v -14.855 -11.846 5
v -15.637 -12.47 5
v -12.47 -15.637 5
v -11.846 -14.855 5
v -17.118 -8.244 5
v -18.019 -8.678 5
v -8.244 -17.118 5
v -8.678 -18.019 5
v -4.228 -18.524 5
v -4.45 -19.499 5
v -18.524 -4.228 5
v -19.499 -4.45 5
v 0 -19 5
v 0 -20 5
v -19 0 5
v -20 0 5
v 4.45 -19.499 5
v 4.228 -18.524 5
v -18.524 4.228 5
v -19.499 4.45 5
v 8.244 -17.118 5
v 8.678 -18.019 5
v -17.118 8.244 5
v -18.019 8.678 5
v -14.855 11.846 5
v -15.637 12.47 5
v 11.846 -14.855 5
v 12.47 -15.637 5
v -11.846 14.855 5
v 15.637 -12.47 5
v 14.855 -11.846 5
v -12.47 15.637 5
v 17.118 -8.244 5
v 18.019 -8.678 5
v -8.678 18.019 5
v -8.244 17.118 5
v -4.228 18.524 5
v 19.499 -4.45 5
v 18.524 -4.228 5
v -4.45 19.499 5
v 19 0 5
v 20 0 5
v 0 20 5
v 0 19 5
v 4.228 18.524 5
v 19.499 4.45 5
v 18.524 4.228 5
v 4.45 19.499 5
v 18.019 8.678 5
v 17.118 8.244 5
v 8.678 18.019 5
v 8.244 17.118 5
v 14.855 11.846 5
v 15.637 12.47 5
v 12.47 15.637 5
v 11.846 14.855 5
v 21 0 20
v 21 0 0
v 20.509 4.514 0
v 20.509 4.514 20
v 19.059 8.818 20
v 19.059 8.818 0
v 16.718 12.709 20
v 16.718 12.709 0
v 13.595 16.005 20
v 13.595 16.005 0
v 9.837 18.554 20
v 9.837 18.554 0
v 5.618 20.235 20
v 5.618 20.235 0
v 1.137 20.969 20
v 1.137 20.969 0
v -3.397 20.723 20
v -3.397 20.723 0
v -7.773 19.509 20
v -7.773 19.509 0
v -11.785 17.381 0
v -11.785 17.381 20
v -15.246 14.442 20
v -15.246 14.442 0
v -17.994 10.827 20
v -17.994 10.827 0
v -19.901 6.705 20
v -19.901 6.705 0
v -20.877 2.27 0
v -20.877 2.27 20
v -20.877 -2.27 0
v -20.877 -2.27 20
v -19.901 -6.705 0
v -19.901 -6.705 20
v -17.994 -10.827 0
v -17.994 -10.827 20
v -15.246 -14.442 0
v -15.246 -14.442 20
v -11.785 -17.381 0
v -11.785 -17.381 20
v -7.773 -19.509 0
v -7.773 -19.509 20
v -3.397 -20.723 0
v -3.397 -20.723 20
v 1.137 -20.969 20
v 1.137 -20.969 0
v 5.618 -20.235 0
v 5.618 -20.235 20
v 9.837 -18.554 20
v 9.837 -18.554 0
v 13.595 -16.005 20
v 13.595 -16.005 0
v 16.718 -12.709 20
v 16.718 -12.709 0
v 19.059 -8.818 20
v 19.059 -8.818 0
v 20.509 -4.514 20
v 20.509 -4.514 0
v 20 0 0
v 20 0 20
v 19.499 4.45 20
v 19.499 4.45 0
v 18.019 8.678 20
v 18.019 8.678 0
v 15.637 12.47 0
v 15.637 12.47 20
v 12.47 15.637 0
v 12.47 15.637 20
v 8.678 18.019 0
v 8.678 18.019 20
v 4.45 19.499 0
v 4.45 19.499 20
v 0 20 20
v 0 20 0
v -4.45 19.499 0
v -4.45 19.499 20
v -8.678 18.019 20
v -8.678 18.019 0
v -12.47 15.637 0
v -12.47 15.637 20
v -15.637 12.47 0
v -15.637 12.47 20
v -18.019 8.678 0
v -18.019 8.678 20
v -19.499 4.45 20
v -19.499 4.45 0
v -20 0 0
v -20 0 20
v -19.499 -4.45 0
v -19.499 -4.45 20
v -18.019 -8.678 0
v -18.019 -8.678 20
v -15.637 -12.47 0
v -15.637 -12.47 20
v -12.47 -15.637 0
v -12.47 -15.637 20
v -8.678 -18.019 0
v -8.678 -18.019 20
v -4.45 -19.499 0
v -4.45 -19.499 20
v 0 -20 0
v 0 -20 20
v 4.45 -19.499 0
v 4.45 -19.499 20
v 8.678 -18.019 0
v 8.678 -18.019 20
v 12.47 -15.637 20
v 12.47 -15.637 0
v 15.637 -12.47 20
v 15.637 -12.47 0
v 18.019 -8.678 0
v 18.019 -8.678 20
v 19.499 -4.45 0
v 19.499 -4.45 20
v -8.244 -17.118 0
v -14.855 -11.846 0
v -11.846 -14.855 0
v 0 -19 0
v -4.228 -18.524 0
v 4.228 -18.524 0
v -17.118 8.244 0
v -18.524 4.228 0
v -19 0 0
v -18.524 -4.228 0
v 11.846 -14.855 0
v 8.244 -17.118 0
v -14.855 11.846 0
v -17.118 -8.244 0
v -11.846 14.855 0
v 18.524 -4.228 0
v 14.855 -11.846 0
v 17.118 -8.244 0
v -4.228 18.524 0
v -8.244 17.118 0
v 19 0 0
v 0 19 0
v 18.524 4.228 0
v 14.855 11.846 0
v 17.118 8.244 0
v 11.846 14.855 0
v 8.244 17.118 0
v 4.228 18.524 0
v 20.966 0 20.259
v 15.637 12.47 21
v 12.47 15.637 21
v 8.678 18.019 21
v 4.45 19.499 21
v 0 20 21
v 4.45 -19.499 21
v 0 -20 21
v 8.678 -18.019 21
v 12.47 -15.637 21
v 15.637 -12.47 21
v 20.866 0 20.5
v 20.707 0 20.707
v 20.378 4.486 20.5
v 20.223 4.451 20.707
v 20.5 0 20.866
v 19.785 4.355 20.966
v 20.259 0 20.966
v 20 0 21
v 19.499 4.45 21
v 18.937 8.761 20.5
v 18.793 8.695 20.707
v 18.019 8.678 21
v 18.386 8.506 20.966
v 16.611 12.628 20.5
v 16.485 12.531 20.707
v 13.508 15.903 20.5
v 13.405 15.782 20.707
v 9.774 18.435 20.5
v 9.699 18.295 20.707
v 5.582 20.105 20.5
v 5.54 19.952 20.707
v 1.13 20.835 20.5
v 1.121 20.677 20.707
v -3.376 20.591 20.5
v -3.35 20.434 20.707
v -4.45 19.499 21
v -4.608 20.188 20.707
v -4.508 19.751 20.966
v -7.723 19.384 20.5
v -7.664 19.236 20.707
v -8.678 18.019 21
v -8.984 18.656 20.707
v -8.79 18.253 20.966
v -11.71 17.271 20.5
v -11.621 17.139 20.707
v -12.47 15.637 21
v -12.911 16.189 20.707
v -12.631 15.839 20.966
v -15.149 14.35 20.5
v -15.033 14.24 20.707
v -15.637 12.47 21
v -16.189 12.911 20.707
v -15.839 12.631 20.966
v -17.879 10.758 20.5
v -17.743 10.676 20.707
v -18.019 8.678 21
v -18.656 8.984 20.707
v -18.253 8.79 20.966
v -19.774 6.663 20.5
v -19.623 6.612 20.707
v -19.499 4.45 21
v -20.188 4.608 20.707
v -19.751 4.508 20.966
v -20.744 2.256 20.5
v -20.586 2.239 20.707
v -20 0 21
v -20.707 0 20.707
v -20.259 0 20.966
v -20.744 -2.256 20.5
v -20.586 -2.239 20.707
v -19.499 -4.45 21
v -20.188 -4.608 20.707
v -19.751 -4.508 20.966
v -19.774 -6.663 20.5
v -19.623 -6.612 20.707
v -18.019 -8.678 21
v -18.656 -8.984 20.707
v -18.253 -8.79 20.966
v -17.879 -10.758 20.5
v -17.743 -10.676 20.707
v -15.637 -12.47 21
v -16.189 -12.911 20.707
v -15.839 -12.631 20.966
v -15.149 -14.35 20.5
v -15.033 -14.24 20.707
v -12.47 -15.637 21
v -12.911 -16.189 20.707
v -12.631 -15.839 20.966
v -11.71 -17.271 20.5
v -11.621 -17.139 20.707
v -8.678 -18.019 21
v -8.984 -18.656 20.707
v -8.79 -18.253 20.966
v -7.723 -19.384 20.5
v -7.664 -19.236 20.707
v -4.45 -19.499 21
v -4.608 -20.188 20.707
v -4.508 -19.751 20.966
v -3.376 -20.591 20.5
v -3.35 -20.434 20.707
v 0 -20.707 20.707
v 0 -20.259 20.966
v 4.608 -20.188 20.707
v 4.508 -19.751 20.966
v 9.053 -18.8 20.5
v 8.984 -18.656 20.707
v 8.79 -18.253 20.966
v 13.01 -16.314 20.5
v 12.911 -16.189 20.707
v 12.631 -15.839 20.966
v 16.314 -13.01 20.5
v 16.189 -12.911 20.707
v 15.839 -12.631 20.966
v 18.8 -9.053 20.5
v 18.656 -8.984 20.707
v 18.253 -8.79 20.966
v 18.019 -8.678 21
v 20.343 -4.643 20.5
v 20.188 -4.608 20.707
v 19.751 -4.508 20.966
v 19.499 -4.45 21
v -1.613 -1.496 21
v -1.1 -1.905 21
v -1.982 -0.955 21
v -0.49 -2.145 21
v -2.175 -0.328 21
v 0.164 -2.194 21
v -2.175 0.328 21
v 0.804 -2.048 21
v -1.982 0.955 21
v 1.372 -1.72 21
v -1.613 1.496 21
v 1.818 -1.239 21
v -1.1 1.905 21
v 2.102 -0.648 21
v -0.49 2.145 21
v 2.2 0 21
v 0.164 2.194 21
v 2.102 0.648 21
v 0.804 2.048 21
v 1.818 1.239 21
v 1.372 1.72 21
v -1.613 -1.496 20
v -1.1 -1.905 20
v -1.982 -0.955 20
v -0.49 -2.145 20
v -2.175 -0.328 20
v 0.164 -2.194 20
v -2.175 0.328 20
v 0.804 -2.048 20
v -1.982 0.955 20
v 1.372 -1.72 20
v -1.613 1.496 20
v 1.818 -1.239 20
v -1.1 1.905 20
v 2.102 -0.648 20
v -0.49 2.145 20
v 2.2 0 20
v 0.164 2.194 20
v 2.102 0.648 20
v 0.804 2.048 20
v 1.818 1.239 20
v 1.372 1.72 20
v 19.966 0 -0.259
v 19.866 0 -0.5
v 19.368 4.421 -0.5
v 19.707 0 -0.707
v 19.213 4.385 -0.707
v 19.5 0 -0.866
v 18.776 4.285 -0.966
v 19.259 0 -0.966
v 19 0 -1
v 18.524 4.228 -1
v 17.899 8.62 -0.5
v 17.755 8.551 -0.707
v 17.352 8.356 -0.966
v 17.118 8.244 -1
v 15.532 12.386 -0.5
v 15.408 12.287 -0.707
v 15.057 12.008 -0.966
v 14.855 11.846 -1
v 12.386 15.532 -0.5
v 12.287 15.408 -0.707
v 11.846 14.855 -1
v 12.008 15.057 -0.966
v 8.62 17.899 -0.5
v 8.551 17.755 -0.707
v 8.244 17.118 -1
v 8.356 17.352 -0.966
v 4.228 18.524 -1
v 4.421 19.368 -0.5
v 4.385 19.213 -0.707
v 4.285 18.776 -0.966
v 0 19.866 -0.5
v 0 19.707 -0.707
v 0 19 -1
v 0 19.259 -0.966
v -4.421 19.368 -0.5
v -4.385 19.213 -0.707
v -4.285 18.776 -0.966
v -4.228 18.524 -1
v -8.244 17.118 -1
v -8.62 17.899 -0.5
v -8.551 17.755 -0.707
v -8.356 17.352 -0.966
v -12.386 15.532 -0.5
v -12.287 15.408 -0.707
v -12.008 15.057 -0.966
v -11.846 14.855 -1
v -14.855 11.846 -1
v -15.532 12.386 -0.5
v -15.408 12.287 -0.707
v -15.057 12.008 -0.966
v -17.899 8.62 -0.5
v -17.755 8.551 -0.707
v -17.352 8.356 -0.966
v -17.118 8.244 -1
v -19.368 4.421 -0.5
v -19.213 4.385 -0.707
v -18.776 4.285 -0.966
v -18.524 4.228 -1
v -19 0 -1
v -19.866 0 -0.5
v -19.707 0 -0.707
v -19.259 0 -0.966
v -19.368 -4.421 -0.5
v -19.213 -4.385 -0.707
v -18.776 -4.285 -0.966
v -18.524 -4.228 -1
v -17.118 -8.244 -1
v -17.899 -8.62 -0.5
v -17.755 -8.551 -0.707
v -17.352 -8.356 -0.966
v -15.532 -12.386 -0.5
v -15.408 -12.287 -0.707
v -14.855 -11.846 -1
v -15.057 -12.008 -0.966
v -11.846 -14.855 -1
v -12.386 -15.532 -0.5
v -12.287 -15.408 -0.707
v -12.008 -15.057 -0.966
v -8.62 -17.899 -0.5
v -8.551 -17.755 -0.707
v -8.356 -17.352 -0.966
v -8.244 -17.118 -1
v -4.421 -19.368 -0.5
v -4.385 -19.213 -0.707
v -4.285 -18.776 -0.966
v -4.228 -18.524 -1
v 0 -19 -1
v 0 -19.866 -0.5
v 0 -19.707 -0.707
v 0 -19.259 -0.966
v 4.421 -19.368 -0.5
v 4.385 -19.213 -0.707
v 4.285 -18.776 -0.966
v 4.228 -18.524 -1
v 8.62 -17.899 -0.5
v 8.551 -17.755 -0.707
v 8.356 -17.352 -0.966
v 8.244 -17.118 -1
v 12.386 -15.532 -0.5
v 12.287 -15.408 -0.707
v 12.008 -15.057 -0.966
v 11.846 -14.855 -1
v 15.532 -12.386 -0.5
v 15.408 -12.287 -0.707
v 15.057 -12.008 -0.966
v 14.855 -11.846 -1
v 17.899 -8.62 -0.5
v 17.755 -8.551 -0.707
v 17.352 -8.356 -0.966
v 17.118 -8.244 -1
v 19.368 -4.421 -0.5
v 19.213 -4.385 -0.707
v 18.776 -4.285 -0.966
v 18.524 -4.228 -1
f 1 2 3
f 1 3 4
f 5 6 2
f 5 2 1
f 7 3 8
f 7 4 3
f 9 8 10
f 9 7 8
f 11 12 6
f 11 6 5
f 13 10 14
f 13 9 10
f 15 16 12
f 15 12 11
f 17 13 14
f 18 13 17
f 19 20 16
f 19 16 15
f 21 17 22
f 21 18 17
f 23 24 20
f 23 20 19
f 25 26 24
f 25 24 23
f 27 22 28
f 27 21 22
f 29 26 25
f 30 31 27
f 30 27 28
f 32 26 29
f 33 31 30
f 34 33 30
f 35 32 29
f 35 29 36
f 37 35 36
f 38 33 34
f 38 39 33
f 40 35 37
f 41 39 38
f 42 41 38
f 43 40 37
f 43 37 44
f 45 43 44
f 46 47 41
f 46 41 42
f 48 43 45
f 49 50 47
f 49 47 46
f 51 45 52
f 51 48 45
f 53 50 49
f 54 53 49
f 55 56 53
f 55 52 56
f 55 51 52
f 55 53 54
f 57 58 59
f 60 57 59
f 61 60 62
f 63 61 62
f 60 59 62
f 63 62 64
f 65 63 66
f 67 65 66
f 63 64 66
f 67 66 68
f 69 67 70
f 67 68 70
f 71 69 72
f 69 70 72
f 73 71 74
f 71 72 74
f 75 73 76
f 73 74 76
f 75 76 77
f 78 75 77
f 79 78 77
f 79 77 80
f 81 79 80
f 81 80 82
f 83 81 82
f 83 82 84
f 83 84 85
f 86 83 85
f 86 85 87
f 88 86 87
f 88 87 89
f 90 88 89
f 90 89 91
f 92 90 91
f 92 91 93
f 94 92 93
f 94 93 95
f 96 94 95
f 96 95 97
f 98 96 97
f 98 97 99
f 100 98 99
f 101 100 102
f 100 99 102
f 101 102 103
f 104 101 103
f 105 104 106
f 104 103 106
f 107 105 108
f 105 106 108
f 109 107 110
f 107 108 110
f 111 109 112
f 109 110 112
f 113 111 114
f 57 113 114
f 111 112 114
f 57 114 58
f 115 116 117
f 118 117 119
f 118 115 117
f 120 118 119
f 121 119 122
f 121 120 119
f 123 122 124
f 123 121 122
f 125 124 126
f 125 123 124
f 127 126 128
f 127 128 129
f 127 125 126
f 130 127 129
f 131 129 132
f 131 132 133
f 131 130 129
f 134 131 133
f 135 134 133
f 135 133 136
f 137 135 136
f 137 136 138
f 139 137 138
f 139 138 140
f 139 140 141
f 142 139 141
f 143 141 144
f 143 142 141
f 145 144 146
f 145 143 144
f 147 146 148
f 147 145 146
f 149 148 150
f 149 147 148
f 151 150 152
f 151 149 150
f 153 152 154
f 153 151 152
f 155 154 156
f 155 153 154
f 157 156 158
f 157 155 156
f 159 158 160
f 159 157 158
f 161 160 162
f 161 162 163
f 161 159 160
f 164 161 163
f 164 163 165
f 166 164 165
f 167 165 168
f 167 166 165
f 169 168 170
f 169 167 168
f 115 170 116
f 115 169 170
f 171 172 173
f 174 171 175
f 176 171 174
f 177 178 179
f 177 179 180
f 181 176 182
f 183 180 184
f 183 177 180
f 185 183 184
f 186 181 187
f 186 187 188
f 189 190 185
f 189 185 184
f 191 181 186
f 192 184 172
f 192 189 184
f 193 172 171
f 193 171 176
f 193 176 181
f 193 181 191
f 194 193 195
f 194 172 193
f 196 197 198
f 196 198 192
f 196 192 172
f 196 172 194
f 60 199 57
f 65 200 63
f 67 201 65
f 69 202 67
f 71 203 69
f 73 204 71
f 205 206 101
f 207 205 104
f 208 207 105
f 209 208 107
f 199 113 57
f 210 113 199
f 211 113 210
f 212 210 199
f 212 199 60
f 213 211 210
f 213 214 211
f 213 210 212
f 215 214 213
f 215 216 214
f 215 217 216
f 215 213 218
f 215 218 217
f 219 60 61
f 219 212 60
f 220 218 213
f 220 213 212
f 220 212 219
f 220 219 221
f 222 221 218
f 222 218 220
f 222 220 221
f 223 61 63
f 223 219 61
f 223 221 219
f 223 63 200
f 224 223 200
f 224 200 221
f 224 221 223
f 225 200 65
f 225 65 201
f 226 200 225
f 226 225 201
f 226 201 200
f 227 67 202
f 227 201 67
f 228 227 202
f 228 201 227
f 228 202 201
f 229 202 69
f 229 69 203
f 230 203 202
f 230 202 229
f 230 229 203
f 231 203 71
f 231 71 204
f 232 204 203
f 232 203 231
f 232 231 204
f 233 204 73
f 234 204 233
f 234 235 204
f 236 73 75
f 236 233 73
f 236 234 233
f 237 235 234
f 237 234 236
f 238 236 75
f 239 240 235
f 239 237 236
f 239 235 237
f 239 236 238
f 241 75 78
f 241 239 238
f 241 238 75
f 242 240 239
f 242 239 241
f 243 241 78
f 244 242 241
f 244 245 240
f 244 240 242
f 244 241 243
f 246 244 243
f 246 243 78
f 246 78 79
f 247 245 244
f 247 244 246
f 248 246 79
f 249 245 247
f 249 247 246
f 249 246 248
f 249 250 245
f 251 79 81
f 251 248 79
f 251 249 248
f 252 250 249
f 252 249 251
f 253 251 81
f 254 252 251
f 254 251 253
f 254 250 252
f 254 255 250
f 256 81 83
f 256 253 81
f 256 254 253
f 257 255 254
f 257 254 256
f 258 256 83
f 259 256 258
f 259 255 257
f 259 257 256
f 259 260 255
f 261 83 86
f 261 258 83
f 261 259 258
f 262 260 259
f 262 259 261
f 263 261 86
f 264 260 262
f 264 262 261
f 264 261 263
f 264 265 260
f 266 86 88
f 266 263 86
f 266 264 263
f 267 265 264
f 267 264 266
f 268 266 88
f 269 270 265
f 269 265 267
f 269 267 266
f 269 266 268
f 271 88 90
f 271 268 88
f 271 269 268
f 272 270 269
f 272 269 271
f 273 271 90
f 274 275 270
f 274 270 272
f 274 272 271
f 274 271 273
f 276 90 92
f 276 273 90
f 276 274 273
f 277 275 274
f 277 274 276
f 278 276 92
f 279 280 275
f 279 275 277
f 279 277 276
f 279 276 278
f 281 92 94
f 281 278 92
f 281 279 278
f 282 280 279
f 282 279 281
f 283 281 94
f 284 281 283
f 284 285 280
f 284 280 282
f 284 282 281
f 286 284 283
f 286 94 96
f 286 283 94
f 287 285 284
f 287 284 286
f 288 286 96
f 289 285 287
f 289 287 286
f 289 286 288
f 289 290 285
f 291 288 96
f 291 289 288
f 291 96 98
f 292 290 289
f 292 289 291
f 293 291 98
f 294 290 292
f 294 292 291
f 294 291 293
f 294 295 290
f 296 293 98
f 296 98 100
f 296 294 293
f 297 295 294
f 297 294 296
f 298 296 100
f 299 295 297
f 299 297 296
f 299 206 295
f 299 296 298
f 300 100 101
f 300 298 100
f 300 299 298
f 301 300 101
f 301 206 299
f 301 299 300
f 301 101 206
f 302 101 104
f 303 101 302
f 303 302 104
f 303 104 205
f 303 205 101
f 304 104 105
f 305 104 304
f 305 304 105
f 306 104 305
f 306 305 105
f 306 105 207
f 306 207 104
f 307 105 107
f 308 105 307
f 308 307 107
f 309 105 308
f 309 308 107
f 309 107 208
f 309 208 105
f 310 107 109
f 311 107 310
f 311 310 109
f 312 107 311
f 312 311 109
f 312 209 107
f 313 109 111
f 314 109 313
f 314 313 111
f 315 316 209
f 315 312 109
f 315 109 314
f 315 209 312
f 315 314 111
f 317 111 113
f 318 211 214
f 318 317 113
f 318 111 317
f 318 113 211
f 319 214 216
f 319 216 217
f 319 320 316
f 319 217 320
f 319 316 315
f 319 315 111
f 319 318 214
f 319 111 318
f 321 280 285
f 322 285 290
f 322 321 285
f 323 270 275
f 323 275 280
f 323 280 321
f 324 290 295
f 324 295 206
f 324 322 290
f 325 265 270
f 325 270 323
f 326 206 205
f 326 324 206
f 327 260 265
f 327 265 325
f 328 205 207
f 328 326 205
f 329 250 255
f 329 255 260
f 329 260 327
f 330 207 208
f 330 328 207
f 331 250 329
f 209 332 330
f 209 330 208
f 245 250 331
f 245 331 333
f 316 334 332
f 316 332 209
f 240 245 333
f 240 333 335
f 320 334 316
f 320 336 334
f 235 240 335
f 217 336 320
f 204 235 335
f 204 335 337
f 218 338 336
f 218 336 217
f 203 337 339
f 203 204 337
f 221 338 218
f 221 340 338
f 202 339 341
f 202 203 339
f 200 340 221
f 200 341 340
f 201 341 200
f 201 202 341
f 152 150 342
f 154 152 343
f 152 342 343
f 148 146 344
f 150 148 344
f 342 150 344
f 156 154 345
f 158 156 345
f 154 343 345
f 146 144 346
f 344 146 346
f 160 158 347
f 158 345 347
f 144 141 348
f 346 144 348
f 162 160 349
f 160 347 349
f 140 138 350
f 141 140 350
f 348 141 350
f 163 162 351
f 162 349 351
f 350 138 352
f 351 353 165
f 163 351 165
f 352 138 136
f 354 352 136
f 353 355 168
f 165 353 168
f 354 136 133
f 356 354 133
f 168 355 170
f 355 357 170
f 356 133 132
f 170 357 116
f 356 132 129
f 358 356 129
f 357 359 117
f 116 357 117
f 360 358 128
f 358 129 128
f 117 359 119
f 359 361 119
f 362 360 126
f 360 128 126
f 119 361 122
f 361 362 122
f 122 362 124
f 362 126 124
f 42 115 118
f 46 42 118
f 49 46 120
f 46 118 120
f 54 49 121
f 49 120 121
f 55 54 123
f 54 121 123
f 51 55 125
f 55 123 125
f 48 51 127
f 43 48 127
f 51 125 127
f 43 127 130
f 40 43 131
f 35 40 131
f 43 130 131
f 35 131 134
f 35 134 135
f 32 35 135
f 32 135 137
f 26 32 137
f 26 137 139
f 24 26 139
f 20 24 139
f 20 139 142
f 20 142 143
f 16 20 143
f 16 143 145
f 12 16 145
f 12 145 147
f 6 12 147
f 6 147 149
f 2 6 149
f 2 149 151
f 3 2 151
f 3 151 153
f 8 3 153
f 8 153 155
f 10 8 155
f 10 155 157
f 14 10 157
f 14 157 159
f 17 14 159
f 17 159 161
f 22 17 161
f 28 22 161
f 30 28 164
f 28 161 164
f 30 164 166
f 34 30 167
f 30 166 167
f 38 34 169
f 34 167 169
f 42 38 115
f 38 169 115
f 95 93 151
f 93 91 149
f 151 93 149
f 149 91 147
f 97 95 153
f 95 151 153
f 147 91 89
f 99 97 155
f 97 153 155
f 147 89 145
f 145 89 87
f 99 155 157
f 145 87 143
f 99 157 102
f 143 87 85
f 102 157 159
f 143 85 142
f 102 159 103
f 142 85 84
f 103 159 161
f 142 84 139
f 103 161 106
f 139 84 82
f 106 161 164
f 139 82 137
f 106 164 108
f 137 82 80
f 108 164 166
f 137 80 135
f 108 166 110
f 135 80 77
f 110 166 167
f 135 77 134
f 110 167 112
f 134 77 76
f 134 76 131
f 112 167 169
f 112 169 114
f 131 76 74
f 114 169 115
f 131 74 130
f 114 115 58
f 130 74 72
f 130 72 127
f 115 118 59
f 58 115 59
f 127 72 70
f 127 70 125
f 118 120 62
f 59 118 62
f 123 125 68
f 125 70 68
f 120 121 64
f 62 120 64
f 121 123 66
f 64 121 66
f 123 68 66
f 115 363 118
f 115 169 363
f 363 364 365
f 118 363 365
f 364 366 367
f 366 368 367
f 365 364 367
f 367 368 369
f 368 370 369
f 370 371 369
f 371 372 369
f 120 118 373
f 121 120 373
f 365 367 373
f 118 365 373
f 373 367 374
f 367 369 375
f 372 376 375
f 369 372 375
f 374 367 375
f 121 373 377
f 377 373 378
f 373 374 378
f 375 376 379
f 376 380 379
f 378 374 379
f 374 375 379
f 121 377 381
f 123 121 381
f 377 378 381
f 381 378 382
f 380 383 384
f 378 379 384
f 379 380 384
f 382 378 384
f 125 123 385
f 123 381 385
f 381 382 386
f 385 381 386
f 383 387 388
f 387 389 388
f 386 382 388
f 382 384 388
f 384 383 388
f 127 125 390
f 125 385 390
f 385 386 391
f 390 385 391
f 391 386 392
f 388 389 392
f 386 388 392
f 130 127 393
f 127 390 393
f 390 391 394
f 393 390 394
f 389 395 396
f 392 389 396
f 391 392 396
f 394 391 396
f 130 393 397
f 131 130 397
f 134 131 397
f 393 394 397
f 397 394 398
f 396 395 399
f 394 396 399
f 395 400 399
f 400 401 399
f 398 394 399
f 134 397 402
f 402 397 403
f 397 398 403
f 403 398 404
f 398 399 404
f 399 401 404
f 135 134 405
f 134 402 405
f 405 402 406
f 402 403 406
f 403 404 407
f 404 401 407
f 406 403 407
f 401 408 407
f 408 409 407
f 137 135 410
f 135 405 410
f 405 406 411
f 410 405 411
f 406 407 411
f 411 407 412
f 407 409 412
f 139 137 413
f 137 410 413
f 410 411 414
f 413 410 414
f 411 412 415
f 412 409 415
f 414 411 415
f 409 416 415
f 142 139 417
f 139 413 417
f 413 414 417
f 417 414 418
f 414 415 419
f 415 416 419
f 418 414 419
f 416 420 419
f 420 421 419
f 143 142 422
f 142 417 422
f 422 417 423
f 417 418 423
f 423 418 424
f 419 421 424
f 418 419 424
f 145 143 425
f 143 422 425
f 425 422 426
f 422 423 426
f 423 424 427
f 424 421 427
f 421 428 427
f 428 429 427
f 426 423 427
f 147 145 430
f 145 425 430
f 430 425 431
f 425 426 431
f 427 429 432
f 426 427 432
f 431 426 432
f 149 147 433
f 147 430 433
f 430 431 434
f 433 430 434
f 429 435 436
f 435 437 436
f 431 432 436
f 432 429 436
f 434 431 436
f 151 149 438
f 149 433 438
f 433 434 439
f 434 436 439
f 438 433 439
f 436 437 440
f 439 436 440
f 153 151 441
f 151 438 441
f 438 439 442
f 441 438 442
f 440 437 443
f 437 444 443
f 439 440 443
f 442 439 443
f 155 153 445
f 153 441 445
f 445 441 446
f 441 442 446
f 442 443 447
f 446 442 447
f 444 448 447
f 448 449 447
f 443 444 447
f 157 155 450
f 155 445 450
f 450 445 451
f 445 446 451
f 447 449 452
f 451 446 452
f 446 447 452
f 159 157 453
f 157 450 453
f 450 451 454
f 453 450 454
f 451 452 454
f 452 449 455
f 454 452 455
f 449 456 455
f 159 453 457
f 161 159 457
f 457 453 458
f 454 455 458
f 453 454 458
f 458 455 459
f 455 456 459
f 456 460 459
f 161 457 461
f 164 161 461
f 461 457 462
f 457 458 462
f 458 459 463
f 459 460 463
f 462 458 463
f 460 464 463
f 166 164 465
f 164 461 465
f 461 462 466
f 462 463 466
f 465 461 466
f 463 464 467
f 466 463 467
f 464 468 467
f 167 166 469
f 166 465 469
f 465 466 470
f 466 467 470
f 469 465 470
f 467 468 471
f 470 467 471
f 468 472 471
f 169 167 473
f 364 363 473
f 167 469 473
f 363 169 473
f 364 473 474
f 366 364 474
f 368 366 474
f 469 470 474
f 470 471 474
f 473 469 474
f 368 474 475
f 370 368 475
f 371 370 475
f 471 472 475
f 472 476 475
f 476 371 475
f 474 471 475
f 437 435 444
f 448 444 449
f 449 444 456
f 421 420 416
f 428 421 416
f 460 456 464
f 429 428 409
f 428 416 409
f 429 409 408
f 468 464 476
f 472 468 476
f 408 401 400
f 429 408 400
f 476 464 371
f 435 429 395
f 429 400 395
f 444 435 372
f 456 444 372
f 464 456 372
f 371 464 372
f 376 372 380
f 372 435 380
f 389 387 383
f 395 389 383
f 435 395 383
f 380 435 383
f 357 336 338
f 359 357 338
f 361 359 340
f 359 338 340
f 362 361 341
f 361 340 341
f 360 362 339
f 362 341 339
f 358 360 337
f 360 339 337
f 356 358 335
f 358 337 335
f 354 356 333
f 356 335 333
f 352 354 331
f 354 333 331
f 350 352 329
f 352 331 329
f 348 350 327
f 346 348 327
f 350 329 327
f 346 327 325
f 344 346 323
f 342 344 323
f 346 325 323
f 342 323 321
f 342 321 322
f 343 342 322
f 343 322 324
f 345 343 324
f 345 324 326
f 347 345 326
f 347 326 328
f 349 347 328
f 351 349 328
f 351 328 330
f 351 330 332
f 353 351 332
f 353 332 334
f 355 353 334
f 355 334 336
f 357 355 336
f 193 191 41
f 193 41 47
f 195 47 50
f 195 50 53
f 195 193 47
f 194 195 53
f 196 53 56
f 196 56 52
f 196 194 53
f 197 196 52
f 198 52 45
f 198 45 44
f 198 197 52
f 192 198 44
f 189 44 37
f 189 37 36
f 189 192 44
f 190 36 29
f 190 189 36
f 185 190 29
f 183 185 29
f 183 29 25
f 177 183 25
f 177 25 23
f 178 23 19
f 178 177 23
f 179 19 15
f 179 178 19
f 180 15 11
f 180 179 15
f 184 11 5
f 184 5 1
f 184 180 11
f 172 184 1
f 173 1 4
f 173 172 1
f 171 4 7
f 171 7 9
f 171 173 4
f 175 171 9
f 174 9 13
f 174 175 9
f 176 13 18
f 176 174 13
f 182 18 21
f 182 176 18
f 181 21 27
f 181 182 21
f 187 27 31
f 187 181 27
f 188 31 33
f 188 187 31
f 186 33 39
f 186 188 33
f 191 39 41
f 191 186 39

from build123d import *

# Parameters (mm, degrees)
CYLINDER_R        = 20
CYLINDER_DEPTH    = 20
THICKNESS_T       = 1
SKETCH_R          = 2.2
POCKET_DEPTH      = 21.001
CYLINDER001_R     = 19
CYLINDER001_DEPTH = 5
THICKNESS001_T    = 1


with BuildPart() as body:
    # Cylinder → Cylinder (join)
    with BuildSketch(Plane.XY):
        Circle(CYLINDER_R)
    extrude(amount=CYLINDER_DEPTH)

    # Thickness
    thickness_openings = [body.faces().sort_by_distance(p)[0] for p in [
        (0, 0, 0),
    ]]
    offset(amount=THICKNESS_T, openings=thickness_openings)

    # Sketch (on Face6 of Thickness) → Pocket (cut, through all)
    with BuildSketch(Plane.XY.offset(21)):
        Circle(SKETCH_R)
    extrude(amount=-POCKET_DEPTH, mode=Mode.SUBTRACT)


with BuildPart() as body001:
    # Cylinder001 → Cylinder001 (join)
    with BuildSketch(Plane.XY):
        Circle(CYLINDER001_R)
    extrude(amount=CYLINDER001_DEPTH)

    # Thickness001
    thickness001_openings = [body001.faces().sort_by_distance(p)[0] for p in [
        (0, 0, 5),
    ]]
    offset(amount=THICKNESS001_T, openings=thickness001_openings)


solid = Compound([body.part, body001.part])
